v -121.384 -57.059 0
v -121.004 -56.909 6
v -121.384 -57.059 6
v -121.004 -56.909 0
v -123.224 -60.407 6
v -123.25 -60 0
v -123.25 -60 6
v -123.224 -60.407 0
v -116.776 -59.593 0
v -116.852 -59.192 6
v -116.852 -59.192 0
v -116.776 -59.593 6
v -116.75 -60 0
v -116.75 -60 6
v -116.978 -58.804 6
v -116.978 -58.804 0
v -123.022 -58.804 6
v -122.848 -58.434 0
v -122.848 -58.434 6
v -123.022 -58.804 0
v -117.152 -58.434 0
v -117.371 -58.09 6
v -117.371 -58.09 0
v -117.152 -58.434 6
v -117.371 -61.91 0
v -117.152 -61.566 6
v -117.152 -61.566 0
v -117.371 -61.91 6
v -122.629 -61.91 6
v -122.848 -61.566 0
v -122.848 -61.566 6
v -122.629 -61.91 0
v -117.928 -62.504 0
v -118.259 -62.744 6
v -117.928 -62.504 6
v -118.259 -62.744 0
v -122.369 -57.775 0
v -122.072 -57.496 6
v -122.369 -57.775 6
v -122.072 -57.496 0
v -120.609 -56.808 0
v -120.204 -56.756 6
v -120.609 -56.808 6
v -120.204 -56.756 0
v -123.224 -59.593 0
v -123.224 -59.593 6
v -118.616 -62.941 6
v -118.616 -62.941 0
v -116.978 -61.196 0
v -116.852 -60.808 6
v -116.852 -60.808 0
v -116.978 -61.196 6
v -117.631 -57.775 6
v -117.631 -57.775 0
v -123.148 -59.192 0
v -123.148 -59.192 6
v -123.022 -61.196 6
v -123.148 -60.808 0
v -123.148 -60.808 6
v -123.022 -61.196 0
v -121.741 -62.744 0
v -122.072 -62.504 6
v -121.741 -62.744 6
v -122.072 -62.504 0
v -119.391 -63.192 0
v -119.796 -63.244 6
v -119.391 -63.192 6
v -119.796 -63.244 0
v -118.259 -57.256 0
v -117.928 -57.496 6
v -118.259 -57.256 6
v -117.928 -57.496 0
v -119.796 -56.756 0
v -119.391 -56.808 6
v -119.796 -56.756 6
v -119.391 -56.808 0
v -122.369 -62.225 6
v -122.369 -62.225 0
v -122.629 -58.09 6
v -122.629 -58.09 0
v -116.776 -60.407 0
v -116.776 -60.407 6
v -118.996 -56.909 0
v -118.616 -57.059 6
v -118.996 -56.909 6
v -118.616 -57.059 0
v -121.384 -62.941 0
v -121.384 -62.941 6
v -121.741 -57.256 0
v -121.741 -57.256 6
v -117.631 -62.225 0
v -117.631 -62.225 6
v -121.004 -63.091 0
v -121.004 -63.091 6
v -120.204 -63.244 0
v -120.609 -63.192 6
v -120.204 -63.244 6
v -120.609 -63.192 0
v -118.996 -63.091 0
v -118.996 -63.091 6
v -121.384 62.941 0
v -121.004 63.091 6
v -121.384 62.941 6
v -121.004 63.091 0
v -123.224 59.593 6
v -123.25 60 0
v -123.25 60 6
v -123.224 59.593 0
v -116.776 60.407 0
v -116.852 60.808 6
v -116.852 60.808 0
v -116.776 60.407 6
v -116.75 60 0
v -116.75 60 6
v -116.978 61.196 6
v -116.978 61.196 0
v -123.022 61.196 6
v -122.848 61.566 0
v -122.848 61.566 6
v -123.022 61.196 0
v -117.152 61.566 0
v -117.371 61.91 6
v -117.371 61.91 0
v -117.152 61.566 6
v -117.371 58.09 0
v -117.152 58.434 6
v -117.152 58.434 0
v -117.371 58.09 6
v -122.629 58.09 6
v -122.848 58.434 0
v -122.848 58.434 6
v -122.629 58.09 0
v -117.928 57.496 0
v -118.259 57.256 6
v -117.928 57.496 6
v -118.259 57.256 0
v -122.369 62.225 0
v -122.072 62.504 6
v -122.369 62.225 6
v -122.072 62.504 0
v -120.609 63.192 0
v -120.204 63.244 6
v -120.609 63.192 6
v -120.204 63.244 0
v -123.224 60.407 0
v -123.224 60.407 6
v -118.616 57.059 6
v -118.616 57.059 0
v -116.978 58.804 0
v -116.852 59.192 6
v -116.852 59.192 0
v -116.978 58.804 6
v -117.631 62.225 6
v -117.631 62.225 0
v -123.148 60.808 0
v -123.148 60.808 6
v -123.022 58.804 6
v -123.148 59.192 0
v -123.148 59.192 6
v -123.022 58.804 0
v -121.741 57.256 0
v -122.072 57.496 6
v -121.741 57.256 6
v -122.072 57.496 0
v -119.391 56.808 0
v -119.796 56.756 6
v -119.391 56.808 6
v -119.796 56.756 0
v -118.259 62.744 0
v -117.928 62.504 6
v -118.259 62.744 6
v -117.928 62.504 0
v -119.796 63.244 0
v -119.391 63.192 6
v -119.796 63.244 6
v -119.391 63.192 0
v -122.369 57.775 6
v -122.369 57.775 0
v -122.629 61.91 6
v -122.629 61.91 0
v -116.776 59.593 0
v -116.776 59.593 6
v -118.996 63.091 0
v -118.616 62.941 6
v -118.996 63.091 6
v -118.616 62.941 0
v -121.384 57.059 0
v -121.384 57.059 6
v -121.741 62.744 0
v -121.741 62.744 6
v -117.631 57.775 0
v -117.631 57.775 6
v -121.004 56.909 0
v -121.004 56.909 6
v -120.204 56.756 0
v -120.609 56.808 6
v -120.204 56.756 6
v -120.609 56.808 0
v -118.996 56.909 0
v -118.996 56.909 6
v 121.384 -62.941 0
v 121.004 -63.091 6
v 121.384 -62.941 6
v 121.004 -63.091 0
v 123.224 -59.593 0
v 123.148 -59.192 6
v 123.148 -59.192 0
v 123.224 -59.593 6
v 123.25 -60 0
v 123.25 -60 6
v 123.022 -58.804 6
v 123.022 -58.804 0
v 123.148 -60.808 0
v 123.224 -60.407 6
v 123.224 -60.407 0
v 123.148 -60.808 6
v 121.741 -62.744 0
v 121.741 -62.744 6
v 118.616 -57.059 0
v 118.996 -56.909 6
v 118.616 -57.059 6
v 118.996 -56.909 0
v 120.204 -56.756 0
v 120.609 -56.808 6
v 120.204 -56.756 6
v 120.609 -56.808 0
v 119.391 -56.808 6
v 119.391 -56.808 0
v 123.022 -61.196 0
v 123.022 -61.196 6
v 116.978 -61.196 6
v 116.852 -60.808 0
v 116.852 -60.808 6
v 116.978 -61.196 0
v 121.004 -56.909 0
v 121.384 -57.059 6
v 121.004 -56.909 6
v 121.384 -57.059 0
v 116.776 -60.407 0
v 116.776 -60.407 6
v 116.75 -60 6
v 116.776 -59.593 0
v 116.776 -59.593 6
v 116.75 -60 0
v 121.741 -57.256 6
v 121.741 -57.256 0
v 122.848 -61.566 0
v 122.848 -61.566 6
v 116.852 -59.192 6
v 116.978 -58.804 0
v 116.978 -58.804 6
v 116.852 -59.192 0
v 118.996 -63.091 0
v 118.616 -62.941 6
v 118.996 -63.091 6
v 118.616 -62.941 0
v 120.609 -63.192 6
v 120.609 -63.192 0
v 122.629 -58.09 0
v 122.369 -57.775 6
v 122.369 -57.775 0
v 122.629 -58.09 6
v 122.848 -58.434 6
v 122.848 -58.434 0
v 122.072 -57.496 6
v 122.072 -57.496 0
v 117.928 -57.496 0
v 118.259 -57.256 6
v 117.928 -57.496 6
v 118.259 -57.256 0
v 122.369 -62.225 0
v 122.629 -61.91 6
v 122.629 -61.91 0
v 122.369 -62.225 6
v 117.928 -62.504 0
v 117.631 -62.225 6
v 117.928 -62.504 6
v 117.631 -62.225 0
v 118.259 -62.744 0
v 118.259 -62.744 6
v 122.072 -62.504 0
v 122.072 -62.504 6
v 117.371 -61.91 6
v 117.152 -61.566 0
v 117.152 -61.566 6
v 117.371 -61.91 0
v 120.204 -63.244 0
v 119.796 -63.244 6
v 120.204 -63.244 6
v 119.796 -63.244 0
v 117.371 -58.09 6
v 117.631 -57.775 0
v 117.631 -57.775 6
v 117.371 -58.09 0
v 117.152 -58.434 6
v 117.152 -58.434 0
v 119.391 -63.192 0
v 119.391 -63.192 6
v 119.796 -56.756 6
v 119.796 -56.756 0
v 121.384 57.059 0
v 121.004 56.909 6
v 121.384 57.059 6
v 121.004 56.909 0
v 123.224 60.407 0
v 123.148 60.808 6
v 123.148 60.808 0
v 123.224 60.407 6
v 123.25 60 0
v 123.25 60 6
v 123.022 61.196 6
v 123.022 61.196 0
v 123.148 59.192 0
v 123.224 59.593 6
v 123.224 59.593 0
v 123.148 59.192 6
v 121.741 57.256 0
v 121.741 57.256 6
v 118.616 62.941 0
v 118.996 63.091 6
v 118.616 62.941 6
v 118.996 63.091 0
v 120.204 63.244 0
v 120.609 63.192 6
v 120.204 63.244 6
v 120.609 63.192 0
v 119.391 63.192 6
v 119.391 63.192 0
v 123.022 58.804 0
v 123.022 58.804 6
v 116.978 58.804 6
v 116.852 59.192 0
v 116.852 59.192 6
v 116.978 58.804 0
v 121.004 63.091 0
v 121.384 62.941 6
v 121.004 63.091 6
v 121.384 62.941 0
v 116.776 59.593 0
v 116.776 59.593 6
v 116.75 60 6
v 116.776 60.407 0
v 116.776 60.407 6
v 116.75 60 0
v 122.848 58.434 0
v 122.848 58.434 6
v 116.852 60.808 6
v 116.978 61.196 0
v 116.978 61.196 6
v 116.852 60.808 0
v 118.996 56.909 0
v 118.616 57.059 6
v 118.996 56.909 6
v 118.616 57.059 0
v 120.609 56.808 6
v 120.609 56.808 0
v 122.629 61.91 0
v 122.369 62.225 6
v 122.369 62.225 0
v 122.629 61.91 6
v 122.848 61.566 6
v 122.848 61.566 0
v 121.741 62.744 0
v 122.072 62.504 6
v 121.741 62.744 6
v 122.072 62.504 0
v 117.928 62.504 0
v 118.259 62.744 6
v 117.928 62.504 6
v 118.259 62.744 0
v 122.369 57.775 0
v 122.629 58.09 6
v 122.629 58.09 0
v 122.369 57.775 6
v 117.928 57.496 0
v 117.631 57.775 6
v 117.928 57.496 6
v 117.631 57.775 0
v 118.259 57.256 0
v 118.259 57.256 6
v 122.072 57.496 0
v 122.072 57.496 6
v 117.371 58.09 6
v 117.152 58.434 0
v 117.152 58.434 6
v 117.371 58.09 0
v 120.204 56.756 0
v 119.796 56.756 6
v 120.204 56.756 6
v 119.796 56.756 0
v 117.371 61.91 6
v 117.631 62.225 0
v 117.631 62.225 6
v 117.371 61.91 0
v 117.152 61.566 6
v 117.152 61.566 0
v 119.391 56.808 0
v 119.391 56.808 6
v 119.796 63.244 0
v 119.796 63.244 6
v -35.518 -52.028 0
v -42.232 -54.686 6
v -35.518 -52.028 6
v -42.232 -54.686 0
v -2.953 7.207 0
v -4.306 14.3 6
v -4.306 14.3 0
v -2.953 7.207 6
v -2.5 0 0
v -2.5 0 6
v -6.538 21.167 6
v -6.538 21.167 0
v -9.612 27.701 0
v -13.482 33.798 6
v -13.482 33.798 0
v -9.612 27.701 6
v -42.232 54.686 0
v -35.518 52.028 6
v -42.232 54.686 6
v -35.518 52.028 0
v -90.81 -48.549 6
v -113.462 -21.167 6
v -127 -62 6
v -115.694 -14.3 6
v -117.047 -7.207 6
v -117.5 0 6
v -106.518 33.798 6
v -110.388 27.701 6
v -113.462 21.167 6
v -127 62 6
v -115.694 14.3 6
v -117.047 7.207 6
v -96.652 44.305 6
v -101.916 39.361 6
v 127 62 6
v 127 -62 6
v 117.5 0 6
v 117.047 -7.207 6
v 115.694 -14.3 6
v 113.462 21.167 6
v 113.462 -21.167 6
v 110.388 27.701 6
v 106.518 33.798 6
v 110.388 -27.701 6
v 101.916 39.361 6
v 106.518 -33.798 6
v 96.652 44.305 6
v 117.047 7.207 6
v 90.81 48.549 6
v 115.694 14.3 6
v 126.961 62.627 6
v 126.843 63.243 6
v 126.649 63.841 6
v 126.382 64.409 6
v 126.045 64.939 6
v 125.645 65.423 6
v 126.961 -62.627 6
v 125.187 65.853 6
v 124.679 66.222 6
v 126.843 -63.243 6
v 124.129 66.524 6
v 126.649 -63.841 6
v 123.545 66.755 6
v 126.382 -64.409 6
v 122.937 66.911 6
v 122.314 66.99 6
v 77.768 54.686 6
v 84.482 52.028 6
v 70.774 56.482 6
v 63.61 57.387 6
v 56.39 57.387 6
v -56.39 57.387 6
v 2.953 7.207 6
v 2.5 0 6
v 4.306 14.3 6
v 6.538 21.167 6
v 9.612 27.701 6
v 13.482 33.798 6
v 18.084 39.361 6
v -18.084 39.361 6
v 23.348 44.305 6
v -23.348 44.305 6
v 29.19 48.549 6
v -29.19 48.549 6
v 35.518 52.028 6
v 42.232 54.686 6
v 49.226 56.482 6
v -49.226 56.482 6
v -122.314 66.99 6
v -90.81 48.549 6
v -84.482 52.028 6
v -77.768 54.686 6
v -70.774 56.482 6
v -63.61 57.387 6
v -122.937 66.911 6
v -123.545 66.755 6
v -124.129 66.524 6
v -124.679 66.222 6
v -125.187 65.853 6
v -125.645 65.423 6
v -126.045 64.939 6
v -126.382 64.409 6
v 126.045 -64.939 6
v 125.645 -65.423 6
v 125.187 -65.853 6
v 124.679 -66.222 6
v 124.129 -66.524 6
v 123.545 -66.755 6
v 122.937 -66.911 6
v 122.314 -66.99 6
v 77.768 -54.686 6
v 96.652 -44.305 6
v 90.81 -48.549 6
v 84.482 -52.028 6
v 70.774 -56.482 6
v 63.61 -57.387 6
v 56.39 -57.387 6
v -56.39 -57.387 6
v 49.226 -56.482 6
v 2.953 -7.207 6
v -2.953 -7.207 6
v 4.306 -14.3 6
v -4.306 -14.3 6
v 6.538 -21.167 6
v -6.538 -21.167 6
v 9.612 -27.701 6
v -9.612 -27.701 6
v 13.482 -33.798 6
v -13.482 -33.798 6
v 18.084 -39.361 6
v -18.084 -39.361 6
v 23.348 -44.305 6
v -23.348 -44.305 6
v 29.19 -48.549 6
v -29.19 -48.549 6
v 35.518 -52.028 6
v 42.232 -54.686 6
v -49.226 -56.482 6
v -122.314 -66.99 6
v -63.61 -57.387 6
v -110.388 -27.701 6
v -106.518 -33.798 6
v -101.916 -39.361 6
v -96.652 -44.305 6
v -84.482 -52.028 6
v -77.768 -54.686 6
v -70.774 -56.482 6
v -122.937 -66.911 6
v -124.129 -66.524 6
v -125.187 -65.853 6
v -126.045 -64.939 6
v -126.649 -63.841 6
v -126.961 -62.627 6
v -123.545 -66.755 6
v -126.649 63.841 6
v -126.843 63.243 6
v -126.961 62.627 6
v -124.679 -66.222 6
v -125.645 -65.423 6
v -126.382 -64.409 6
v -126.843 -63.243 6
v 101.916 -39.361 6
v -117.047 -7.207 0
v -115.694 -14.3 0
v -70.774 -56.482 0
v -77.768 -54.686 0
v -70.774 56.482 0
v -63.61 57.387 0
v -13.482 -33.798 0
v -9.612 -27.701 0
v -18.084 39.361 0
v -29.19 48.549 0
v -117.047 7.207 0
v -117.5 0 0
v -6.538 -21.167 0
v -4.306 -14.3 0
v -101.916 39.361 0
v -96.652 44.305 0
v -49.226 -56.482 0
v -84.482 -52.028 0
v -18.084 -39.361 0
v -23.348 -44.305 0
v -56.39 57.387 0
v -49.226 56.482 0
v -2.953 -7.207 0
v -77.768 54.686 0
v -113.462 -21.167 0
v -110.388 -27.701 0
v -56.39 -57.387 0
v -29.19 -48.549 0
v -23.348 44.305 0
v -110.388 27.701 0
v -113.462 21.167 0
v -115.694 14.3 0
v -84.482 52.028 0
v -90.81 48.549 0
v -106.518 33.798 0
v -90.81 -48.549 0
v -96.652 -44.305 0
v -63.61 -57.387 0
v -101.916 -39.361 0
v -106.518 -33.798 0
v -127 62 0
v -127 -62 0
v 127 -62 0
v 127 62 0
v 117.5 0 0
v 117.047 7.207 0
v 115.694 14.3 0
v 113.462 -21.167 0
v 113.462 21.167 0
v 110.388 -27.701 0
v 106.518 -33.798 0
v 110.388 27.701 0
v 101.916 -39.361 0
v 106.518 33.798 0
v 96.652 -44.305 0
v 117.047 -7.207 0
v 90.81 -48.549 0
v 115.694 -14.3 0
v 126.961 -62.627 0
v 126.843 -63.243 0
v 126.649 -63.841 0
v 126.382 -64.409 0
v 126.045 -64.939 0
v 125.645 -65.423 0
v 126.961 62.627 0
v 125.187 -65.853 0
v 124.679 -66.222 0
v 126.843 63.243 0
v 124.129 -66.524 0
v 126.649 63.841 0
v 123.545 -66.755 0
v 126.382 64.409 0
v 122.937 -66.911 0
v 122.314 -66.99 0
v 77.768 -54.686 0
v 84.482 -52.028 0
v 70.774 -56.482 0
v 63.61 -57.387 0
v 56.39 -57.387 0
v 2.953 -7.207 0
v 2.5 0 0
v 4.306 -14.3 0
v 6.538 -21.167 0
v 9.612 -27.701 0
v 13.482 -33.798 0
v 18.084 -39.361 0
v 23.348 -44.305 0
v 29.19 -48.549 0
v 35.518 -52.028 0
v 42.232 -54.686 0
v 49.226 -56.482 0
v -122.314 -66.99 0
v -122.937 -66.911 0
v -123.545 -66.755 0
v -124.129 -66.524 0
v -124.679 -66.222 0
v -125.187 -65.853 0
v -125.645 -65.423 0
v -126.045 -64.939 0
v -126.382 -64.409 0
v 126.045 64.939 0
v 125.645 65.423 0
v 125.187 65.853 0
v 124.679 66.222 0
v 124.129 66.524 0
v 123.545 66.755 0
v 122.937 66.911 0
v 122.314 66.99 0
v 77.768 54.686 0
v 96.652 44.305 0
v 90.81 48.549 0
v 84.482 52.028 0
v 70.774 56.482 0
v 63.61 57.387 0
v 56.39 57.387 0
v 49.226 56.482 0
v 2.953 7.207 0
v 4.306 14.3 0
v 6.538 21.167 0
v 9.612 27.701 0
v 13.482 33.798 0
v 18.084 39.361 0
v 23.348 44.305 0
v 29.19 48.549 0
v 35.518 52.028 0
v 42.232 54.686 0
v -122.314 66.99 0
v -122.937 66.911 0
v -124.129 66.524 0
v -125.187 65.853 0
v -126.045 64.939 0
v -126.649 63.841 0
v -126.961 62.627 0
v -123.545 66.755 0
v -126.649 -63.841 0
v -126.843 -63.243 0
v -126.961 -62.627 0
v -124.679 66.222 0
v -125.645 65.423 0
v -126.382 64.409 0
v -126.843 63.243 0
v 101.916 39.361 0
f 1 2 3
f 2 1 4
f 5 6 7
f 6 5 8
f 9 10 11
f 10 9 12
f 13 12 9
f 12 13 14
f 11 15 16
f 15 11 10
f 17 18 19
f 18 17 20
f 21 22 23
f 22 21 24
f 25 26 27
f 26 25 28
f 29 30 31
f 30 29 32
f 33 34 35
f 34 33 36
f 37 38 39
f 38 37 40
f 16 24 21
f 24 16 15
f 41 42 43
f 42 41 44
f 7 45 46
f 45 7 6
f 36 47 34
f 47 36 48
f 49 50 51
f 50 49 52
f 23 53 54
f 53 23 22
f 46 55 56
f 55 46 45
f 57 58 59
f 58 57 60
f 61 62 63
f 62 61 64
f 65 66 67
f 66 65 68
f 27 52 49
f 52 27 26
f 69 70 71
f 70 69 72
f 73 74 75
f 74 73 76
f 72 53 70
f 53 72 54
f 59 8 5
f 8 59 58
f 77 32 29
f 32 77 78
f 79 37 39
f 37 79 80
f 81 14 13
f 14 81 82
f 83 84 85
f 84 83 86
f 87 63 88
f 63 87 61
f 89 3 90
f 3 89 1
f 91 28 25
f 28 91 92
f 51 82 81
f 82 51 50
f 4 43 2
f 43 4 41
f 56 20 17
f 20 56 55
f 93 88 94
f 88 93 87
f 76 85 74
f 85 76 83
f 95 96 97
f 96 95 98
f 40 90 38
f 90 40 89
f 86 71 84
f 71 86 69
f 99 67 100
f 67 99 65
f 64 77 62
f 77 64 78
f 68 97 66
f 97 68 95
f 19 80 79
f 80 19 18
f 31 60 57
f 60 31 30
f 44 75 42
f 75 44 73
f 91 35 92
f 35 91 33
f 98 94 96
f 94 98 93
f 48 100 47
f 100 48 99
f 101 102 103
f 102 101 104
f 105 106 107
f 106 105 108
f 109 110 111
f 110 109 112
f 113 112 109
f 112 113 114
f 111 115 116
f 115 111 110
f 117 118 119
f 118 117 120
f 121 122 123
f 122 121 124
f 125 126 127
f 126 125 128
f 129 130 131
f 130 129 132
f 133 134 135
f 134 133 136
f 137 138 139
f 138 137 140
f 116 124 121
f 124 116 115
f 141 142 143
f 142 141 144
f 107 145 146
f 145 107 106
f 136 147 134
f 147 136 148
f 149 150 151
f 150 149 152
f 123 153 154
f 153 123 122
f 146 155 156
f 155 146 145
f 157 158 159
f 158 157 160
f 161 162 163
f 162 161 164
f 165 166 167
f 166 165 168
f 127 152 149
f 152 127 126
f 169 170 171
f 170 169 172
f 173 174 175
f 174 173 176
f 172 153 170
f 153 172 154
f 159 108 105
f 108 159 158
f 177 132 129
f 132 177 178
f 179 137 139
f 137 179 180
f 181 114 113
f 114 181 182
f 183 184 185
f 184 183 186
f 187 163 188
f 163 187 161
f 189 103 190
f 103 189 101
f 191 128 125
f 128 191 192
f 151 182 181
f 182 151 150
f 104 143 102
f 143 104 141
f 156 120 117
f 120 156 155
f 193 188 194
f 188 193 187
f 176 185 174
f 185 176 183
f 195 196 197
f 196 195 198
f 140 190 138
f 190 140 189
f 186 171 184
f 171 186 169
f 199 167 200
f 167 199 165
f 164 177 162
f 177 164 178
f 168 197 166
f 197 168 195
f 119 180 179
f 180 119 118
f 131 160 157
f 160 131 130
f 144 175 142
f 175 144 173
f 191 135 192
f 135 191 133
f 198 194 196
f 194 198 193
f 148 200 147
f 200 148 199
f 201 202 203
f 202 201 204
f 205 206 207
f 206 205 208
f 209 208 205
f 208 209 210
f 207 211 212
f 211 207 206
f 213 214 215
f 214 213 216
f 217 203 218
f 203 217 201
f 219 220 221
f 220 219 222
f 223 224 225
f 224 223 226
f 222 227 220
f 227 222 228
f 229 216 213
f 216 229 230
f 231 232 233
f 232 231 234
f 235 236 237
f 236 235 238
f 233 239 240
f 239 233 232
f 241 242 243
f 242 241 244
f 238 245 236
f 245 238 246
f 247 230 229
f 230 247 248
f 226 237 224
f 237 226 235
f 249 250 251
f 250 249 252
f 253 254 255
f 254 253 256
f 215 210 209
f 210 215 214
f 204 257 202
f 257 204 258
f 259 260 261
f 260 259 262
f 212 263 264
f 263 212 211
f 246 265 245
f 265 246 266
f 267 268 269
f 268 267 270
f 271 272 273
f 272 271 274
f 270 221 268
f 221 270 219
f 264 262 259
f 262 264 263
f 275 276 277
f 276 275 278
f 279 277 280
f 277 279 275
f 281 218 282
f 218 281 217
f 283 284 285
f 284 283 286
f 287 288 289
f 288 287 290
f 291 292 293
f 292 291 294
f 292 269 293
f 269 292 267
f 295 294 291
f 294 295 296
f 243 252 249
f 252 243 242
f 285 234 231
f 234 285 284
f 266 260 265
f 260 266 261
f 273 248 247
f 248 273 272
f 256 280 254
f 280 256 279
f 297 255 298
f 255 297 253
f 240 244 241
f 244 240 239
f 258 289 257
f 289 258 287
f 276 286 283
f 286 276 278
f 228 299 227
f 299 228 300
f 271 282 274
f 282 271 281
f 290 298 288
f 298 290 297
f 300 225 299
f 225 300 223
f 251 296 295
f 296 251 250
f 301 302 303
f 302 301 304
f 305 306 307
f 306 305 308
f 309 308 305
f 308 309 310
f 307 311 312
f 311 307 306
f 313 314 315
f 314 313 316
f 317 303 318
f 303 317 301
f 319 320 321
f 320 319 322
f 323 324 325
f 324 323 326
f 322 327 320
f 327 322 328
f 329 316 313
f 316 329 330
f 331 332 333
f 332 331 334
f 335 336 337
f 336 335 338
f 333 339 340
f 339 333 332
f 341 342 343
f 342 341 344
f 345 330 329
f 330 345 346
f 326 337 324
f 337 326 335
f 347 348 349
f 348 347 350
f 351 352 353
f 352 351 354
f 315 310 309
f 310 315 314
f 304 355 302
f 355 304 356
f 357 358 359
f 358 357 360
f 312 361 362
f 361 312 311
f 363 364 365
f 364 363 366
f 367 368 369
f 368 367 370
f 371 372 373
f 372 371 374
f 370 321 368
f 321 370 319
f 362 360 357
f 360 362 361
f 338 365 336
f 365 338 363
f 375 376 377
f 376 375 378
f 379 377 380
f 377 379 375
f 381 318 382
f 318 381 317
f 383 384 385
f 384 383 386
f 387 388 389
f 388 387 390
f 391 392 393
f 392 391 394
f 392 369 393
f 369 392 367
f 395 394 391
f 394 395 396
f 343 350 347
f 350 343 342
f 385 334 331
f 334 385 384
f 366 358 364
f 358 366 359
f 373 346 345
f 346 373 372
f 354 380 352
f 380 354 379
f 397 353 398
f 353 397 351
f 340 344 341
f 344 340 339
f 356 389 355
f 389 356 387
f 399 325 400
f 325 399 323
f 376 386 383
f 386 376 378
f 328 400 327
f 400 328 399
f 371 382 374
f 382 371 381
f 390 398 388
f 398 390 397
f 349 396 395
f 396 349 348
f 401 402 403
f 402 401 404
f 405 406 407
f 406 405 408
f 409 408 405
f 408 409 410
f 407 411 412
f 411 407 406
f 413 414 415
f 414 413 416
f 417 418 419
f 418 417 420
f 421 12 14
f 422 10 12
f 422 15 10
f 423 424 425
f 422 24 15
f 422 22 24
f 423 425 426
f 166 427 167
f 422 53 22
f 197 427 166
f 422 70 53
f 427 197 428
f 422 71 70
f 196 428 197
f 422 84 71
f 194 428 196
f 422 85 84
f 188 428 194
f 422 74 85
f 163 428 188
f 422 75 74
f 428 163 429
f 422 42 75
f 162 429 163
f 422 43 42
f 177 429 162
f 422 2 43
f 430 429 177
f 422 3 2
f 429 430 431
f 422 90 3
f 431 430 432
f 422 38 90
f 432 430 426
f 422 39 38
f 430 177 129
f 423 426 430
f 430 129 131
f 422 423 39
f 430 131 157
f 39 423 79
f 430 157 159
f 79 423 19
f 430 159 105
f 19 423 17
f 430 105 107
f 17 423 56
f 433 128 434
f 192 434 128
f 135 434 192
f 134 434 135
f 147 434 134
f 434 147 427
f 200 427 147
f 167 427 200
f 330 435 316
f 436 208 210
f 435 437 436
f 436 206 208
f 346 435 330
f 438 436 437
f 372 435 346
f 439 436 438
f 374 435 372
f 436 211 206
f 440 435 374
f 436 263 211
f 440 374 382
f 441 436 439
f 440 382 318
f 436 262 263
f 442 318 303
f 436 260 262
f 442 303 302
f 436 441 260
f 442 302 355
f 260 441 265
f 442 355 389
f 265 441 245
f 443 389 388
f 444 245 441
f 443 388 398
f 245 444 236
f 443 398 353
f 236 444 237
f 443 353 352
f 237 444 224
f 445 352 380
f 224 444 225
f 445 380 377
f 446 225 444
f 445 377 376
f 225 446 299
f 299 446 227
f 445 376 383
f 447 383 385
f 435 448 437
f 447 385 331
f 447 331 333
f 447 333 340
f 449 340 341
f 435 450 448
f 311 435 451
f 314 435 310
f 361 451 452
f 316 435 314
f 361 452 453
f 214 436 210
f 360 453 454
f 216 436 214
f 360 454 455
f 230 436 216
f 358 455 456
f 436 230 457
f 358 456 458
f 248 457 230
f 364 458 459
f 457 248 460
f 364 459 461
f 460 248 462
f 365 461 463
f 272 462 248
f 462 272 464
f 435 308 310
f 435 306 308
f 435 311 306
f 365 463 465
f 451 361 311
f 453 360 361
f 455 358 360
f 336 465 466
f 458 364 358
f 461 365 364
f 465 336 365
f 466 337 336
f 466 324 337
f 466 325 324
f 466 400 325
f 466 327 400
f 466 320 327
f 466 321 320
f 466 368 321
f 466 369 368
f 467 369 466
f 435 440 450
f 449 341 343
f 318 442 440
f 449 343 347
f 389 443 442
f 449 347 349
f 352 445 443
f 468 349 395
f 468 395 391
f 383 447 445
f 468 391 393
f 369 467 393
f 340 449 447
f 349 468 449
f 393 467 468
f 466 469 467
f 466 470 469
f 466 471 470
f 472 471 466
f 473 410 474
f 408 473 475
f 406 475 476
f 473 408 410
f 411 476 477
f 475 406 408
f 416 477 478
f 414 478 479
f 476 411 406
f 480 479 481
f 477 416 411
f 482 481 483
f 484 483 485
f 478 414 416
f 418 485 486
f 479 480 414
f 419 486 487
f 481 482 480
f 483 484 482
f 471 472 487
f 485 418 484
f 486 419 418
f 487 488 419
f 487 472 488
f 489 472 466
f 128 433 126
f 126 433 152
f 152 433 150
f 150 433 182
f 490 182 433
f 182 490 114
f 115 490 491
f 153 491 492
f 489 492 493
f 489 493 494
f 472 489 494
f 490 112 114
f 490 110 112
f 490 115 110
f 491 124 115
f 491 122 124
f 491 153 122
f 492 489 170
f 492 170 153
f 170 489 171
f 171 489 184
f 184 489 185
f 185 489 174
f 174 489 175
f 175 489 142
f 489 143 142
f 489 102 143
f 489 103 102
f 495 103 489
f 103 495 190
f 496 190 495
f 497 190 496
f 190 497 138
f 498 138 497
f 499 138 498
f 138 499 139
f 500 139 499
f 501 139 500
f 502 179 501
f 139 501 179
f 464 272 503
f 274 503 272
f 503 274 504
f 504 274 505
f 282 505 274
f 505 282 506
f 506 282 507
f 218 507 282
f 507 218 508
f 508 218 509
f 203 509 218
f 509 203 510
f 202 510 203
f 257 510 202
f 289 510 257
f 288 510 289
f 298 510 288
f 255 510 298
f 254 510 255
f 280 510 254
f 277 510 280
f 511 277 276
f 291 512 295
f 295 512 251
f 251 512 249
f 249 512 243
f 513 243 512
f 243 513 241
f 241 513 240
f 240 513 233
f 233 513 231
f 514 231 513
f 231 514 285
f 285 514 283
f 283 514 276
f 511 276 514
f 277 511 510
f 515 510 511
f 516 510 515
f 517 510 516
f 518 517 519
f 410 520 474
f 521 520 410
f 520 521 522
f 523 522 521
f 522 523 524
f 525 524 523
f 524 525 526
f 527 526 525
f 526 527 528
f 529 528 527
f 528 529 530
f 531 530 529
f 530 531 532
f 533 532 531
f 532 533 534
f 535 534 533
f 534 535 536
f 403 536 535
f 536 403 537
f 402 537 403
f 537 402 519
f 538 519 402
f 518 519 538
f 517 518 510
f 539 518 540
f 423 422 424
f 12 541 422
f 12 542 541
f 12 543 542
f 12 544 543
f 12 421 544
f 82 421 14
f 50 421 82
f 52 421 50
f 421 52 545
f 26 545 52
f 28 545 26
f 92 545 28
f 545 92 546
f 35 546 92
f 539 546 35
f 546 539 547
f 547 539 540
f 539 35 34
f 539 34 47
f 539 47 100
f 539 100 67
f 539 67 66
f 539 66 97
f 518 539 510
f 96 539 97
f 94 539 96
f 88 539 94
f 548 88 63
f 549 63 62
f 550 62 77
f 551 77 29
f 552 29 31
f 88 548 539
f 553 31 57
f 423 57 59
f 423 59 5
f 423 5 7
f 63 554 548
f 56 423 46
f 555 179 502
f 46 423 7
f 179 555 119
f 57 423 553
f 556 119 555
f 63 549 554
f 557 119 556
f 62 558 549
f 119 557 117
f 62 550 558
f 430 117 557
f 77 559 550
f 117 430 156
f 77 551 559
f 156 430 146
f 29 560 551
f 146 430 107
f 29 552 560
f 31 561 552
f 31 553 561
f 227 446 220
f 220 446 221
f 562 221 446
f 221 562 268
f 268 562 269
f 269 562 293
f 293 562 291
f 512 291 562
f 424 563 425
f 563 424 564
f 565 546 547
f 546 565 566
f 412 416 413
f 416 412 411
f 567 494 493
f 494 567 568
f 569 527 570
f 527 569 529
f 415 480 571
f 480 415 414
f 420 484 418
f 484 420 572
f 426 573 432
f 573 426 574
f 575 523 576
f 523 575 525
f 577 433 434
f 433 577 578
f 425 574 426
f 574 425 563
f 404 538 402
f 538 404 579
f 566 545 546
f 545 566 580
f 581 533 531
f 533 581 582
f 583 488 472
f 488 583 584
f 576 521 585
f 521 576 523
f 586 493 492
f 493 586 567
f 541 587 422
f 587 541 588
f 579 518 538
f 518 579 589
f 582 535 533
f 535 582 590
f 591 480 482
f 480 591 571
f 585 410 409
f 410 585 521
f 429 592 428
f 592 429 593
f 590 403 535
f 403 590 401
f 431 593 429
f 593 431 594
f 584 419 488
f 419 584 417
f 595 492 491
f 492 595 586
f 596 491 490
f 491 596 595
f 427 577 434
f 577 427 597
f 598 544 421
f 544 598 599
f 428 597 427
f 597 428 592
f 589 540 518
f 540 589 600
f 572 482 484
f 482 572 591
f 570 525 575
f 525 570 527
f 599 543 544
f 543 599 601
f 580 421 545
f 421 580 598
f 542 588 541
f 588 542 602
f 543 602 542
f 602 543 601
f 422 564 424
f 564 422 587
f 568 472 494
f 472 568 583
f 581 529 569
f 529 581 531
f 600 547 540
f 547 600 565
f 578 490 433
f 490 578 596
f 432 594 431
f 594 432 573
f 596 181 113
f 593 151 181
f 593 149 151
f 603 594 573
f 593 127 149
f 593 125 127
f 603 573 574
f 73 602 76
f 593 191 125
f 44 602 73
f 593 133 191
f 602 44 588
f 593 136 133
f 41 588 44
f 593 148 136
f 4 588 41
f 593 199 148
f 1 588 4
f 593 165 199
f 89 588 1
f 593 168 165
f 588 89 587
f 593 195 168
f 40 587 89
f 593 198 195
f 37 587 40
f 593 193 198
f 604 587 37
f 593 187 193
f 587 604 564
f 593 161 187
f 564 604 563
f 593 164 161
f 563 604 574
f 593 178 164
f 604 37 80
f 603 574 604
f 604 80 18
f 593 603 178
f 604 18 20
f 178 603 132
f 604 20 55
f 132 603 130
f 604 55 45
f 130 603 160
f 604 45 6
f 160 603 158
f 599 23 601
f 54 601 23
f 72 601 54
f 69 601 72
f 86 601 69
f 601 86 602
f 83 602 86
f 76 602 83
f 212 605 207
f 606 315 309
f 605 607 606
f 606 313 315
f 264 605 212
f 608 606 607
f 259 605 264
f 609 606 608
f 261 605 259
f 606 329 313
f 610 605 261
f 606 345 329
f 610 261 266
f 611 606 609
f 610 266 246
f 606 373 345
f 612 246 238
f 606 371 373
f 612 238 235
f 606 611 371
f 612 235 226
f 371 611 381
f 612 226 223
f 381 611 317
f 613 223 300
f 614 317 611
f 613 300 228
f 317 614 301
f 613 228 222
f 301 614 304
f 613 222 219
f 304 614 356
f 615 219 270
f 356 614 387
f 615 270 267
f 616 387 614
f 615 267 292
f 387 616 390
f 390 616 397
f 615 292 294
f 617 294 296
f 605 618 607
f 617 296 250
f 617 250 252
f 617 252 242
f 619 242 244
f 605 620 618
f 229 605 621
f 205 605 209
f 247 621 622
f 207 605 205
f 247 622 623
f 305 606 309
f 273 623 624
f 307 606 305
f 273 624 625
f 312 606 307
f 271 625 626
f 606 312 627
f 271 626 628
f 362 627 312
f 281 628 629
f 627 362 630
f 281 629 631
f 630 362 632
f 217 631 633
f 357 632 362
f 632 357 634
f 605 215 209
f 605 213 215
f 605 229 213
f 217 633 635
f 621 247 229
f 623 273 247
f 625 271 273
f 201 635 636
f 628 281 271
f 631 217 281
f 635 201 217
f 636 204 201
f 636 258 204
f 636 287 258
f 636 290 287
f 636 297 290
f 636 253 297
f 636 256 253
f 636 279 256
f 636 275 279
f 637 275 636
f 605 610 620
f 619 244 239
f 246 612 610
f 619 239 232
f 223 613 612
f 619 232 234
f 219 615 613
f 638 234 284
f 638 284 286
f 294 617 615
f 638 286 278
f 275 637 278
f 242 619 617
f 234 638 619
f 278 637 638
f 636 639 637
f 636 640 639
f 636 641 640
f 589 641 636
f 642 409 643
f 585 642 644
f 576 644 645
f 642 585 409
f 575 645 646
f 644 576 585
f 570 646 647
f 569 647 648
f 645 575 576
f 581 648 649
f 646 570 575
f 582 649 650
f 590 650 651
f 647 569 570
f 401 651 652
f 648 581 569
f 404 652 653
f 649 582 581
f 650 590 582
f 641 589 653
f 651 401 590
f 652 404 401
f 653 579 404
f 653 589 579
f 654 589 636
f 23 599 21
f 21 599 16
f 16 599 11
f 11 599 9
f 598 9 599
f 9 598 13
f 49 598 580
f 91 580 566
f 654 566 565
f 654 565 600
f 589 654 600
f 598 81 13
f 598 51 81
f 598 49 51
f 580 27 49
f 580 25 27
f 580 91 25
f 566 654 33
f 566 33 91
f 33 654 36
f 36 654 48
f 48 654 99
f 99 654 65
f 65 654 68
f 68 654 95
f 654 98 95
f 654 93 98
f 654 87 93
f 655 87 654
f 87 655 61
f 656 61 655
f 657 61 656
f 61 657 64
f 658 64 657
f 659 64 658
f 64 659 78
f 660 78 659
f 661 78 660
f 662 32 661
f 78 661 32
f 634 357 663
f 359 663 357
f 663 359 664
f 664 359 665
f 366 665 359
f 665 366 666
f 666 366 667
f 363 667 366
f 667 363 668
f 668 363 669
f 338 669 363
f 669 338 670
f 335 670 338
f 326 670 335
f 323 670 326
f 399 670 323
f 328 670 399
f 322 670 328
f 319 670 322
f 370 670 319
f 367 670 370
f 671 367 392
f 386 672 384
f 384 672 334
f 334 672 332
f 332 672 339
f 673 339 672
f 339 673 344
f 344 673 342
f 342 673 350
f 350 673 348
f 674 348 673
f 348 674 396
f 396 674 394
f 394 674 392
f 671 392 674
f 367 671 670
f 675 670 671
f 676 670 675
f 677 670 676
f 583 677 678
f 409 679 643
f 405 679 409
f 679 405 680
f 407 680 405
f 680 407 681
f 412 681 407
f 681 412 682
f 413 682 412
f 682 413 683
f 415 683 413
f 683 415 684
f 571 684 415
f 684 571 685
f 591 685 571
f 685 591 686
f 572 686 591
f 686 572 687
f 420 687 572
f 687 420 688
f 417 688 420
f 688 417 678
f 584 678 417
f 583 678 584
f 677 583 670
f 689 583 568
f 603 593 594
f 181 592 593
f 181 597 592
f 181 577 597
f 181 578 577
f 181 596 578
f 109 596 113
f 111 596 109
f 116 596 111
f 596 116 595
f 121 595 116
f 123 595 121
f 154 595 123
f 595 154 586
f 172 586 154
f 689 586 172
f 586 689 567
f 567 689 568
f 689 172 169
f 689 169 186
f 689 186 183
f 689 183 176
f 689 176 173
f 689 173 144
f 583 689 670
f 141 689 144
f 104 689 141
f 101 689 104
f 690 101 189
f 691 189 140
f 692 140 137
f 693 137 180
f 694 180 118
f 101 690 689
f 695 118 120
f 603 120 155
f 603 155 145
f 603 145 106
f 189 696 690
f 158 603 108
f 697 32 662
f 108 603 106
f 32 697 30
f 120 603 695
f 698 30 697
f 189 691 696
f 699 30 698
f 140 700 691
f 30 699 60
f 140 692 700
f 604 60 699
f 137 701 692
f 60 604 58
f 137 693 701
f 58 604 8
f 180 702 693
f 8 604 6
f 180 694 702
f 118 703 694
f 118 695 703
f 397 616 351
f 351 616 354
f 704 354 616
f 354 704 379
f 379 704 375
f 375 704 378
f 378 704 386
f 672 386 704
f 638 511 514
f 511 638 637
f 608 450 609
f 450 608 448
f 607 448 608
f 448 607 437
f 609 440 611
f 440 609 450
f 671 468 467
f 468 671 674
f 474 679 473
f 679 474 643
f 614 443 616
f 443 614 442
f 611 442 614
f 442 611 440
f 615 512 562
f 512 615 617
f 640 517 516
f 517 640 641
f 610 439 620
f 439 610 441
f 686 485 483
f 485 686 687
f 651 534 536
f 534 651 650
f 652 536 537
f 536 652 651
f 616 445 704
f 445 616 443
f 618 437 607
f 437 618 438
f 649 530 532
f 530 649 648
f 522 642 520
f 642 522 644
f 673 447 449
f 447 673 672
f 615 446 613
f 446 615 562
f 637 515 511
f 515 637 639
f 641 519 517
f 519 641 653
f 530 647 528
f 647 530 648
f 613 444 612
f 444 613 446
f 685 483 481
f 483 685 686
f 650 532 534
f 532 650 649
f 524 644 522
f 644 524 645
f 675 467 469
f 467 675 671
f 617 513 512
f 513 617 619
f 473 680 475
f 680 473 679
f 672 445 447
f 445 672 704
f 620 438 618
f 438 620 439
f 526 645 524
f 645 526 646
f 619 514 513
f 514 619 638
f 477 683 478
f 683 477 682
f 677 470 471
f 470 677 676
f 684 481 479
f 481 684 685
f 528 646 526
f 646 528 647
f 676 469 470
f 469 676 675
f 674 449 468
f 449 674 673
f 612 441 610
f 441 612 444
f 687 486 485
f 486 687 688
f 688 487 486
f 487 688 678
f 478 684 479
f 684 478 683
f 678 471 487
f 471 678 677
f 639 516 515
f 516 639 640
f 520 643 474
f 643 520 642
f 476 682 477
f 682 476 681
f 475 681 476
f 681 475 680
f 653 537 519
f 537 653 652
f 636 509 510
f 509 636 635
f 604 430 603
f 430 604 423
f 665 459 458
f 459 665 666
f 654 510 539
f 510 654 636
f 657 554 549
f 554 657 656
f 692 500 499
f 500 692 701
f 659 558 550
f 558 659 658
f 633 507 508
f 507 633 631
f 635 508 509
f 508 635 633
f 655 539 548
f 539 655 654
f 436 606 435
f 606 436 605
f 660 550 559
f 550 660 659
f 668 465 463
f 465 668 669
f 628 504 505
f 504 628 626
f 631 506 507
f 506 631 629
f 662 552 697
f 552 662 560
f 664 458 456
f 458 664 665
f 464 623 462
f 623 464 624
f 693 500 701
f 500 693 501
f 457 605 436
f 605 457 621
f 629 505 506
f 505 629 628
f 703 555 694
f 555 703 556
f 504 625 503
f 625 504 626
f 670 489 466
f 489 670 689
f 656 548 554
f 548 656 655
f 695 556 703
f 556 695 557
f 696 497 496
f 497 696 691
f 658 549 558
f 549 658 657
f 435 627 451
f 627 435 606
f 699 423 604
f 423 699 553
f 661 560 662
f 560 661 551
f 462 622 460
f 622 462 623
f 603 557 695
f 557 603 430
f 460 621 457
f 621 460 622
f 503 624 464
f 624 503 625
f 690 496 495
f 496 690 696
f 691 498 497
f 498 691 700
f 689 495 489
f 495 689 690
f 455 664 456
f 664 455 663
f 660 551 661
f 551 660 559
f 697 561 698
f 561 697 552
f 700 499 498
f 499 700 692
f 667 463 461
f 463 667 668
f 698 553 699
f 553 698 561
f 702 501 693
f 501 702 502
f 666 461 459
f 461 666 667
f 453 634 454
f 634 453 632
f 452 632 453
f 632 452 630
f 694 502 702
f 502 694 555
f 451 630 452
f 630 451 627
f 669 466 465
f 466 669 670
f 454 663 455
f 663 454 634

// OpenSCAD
$fn = 50;

difference() {
	union() {
		hull() {
			translate(v = [-122.0, 62.0, 0]) {
				cylinder(h = 6, r = 5);
			}
			translate(v = [122.0, 62.0, 0]) {
				cylinder(h = 6, r = 5);
			}
			translate(v = [-122.0, -62.0, 0]) {
				cylinder(h = 6, r = 5);
			}
			translate(v = [122.0, -62.0, 0]) {
				cylinder(h = 6, r = 5);
			}
		}
	}
	union() {
		translate(v = [-120.0, -60.0, -100.0]) {
			cylinder(h = 200, r = 3.25);
		}
		translate(v = [-120.0, 60.0, -100.0]) {
			cylinder(h = 200, r = 3.25);
		}
		translate(v = [120.0, -60.0, -100.0]) {
			cylinder(h = 200, r = 3.25);
		}
		translate(v = [120.0, 60.0, -100.0]) {
			cylinder(h = 200, r = 3.25);
		}
		translate(v = [-120.0, -60.0, -100.0]) {
			cylinder(h = 200, r = 1.8);
		}
		translate(v = [-120.0, 60.0, -100.0]) {
			cylinder(h = 200, r = 1.8);
		}
		translate(v = [120.0, -60.0, -100.0]) {
			cylinder(h = 200, r = 1.8);
		}
		translate(v = [120.0, 60.0, -100.0]) {
			cylinder(h = 200, r = 1.8);
		}
		translate(v = [-60.0, 0, 0.0]) {
			cylinder(h = 6, r = 57.5);
		}
		translate(v = [60.0, 0, 0.0]) {
			cylinder(h = 6, r = 57.5);
		}
	}
}
